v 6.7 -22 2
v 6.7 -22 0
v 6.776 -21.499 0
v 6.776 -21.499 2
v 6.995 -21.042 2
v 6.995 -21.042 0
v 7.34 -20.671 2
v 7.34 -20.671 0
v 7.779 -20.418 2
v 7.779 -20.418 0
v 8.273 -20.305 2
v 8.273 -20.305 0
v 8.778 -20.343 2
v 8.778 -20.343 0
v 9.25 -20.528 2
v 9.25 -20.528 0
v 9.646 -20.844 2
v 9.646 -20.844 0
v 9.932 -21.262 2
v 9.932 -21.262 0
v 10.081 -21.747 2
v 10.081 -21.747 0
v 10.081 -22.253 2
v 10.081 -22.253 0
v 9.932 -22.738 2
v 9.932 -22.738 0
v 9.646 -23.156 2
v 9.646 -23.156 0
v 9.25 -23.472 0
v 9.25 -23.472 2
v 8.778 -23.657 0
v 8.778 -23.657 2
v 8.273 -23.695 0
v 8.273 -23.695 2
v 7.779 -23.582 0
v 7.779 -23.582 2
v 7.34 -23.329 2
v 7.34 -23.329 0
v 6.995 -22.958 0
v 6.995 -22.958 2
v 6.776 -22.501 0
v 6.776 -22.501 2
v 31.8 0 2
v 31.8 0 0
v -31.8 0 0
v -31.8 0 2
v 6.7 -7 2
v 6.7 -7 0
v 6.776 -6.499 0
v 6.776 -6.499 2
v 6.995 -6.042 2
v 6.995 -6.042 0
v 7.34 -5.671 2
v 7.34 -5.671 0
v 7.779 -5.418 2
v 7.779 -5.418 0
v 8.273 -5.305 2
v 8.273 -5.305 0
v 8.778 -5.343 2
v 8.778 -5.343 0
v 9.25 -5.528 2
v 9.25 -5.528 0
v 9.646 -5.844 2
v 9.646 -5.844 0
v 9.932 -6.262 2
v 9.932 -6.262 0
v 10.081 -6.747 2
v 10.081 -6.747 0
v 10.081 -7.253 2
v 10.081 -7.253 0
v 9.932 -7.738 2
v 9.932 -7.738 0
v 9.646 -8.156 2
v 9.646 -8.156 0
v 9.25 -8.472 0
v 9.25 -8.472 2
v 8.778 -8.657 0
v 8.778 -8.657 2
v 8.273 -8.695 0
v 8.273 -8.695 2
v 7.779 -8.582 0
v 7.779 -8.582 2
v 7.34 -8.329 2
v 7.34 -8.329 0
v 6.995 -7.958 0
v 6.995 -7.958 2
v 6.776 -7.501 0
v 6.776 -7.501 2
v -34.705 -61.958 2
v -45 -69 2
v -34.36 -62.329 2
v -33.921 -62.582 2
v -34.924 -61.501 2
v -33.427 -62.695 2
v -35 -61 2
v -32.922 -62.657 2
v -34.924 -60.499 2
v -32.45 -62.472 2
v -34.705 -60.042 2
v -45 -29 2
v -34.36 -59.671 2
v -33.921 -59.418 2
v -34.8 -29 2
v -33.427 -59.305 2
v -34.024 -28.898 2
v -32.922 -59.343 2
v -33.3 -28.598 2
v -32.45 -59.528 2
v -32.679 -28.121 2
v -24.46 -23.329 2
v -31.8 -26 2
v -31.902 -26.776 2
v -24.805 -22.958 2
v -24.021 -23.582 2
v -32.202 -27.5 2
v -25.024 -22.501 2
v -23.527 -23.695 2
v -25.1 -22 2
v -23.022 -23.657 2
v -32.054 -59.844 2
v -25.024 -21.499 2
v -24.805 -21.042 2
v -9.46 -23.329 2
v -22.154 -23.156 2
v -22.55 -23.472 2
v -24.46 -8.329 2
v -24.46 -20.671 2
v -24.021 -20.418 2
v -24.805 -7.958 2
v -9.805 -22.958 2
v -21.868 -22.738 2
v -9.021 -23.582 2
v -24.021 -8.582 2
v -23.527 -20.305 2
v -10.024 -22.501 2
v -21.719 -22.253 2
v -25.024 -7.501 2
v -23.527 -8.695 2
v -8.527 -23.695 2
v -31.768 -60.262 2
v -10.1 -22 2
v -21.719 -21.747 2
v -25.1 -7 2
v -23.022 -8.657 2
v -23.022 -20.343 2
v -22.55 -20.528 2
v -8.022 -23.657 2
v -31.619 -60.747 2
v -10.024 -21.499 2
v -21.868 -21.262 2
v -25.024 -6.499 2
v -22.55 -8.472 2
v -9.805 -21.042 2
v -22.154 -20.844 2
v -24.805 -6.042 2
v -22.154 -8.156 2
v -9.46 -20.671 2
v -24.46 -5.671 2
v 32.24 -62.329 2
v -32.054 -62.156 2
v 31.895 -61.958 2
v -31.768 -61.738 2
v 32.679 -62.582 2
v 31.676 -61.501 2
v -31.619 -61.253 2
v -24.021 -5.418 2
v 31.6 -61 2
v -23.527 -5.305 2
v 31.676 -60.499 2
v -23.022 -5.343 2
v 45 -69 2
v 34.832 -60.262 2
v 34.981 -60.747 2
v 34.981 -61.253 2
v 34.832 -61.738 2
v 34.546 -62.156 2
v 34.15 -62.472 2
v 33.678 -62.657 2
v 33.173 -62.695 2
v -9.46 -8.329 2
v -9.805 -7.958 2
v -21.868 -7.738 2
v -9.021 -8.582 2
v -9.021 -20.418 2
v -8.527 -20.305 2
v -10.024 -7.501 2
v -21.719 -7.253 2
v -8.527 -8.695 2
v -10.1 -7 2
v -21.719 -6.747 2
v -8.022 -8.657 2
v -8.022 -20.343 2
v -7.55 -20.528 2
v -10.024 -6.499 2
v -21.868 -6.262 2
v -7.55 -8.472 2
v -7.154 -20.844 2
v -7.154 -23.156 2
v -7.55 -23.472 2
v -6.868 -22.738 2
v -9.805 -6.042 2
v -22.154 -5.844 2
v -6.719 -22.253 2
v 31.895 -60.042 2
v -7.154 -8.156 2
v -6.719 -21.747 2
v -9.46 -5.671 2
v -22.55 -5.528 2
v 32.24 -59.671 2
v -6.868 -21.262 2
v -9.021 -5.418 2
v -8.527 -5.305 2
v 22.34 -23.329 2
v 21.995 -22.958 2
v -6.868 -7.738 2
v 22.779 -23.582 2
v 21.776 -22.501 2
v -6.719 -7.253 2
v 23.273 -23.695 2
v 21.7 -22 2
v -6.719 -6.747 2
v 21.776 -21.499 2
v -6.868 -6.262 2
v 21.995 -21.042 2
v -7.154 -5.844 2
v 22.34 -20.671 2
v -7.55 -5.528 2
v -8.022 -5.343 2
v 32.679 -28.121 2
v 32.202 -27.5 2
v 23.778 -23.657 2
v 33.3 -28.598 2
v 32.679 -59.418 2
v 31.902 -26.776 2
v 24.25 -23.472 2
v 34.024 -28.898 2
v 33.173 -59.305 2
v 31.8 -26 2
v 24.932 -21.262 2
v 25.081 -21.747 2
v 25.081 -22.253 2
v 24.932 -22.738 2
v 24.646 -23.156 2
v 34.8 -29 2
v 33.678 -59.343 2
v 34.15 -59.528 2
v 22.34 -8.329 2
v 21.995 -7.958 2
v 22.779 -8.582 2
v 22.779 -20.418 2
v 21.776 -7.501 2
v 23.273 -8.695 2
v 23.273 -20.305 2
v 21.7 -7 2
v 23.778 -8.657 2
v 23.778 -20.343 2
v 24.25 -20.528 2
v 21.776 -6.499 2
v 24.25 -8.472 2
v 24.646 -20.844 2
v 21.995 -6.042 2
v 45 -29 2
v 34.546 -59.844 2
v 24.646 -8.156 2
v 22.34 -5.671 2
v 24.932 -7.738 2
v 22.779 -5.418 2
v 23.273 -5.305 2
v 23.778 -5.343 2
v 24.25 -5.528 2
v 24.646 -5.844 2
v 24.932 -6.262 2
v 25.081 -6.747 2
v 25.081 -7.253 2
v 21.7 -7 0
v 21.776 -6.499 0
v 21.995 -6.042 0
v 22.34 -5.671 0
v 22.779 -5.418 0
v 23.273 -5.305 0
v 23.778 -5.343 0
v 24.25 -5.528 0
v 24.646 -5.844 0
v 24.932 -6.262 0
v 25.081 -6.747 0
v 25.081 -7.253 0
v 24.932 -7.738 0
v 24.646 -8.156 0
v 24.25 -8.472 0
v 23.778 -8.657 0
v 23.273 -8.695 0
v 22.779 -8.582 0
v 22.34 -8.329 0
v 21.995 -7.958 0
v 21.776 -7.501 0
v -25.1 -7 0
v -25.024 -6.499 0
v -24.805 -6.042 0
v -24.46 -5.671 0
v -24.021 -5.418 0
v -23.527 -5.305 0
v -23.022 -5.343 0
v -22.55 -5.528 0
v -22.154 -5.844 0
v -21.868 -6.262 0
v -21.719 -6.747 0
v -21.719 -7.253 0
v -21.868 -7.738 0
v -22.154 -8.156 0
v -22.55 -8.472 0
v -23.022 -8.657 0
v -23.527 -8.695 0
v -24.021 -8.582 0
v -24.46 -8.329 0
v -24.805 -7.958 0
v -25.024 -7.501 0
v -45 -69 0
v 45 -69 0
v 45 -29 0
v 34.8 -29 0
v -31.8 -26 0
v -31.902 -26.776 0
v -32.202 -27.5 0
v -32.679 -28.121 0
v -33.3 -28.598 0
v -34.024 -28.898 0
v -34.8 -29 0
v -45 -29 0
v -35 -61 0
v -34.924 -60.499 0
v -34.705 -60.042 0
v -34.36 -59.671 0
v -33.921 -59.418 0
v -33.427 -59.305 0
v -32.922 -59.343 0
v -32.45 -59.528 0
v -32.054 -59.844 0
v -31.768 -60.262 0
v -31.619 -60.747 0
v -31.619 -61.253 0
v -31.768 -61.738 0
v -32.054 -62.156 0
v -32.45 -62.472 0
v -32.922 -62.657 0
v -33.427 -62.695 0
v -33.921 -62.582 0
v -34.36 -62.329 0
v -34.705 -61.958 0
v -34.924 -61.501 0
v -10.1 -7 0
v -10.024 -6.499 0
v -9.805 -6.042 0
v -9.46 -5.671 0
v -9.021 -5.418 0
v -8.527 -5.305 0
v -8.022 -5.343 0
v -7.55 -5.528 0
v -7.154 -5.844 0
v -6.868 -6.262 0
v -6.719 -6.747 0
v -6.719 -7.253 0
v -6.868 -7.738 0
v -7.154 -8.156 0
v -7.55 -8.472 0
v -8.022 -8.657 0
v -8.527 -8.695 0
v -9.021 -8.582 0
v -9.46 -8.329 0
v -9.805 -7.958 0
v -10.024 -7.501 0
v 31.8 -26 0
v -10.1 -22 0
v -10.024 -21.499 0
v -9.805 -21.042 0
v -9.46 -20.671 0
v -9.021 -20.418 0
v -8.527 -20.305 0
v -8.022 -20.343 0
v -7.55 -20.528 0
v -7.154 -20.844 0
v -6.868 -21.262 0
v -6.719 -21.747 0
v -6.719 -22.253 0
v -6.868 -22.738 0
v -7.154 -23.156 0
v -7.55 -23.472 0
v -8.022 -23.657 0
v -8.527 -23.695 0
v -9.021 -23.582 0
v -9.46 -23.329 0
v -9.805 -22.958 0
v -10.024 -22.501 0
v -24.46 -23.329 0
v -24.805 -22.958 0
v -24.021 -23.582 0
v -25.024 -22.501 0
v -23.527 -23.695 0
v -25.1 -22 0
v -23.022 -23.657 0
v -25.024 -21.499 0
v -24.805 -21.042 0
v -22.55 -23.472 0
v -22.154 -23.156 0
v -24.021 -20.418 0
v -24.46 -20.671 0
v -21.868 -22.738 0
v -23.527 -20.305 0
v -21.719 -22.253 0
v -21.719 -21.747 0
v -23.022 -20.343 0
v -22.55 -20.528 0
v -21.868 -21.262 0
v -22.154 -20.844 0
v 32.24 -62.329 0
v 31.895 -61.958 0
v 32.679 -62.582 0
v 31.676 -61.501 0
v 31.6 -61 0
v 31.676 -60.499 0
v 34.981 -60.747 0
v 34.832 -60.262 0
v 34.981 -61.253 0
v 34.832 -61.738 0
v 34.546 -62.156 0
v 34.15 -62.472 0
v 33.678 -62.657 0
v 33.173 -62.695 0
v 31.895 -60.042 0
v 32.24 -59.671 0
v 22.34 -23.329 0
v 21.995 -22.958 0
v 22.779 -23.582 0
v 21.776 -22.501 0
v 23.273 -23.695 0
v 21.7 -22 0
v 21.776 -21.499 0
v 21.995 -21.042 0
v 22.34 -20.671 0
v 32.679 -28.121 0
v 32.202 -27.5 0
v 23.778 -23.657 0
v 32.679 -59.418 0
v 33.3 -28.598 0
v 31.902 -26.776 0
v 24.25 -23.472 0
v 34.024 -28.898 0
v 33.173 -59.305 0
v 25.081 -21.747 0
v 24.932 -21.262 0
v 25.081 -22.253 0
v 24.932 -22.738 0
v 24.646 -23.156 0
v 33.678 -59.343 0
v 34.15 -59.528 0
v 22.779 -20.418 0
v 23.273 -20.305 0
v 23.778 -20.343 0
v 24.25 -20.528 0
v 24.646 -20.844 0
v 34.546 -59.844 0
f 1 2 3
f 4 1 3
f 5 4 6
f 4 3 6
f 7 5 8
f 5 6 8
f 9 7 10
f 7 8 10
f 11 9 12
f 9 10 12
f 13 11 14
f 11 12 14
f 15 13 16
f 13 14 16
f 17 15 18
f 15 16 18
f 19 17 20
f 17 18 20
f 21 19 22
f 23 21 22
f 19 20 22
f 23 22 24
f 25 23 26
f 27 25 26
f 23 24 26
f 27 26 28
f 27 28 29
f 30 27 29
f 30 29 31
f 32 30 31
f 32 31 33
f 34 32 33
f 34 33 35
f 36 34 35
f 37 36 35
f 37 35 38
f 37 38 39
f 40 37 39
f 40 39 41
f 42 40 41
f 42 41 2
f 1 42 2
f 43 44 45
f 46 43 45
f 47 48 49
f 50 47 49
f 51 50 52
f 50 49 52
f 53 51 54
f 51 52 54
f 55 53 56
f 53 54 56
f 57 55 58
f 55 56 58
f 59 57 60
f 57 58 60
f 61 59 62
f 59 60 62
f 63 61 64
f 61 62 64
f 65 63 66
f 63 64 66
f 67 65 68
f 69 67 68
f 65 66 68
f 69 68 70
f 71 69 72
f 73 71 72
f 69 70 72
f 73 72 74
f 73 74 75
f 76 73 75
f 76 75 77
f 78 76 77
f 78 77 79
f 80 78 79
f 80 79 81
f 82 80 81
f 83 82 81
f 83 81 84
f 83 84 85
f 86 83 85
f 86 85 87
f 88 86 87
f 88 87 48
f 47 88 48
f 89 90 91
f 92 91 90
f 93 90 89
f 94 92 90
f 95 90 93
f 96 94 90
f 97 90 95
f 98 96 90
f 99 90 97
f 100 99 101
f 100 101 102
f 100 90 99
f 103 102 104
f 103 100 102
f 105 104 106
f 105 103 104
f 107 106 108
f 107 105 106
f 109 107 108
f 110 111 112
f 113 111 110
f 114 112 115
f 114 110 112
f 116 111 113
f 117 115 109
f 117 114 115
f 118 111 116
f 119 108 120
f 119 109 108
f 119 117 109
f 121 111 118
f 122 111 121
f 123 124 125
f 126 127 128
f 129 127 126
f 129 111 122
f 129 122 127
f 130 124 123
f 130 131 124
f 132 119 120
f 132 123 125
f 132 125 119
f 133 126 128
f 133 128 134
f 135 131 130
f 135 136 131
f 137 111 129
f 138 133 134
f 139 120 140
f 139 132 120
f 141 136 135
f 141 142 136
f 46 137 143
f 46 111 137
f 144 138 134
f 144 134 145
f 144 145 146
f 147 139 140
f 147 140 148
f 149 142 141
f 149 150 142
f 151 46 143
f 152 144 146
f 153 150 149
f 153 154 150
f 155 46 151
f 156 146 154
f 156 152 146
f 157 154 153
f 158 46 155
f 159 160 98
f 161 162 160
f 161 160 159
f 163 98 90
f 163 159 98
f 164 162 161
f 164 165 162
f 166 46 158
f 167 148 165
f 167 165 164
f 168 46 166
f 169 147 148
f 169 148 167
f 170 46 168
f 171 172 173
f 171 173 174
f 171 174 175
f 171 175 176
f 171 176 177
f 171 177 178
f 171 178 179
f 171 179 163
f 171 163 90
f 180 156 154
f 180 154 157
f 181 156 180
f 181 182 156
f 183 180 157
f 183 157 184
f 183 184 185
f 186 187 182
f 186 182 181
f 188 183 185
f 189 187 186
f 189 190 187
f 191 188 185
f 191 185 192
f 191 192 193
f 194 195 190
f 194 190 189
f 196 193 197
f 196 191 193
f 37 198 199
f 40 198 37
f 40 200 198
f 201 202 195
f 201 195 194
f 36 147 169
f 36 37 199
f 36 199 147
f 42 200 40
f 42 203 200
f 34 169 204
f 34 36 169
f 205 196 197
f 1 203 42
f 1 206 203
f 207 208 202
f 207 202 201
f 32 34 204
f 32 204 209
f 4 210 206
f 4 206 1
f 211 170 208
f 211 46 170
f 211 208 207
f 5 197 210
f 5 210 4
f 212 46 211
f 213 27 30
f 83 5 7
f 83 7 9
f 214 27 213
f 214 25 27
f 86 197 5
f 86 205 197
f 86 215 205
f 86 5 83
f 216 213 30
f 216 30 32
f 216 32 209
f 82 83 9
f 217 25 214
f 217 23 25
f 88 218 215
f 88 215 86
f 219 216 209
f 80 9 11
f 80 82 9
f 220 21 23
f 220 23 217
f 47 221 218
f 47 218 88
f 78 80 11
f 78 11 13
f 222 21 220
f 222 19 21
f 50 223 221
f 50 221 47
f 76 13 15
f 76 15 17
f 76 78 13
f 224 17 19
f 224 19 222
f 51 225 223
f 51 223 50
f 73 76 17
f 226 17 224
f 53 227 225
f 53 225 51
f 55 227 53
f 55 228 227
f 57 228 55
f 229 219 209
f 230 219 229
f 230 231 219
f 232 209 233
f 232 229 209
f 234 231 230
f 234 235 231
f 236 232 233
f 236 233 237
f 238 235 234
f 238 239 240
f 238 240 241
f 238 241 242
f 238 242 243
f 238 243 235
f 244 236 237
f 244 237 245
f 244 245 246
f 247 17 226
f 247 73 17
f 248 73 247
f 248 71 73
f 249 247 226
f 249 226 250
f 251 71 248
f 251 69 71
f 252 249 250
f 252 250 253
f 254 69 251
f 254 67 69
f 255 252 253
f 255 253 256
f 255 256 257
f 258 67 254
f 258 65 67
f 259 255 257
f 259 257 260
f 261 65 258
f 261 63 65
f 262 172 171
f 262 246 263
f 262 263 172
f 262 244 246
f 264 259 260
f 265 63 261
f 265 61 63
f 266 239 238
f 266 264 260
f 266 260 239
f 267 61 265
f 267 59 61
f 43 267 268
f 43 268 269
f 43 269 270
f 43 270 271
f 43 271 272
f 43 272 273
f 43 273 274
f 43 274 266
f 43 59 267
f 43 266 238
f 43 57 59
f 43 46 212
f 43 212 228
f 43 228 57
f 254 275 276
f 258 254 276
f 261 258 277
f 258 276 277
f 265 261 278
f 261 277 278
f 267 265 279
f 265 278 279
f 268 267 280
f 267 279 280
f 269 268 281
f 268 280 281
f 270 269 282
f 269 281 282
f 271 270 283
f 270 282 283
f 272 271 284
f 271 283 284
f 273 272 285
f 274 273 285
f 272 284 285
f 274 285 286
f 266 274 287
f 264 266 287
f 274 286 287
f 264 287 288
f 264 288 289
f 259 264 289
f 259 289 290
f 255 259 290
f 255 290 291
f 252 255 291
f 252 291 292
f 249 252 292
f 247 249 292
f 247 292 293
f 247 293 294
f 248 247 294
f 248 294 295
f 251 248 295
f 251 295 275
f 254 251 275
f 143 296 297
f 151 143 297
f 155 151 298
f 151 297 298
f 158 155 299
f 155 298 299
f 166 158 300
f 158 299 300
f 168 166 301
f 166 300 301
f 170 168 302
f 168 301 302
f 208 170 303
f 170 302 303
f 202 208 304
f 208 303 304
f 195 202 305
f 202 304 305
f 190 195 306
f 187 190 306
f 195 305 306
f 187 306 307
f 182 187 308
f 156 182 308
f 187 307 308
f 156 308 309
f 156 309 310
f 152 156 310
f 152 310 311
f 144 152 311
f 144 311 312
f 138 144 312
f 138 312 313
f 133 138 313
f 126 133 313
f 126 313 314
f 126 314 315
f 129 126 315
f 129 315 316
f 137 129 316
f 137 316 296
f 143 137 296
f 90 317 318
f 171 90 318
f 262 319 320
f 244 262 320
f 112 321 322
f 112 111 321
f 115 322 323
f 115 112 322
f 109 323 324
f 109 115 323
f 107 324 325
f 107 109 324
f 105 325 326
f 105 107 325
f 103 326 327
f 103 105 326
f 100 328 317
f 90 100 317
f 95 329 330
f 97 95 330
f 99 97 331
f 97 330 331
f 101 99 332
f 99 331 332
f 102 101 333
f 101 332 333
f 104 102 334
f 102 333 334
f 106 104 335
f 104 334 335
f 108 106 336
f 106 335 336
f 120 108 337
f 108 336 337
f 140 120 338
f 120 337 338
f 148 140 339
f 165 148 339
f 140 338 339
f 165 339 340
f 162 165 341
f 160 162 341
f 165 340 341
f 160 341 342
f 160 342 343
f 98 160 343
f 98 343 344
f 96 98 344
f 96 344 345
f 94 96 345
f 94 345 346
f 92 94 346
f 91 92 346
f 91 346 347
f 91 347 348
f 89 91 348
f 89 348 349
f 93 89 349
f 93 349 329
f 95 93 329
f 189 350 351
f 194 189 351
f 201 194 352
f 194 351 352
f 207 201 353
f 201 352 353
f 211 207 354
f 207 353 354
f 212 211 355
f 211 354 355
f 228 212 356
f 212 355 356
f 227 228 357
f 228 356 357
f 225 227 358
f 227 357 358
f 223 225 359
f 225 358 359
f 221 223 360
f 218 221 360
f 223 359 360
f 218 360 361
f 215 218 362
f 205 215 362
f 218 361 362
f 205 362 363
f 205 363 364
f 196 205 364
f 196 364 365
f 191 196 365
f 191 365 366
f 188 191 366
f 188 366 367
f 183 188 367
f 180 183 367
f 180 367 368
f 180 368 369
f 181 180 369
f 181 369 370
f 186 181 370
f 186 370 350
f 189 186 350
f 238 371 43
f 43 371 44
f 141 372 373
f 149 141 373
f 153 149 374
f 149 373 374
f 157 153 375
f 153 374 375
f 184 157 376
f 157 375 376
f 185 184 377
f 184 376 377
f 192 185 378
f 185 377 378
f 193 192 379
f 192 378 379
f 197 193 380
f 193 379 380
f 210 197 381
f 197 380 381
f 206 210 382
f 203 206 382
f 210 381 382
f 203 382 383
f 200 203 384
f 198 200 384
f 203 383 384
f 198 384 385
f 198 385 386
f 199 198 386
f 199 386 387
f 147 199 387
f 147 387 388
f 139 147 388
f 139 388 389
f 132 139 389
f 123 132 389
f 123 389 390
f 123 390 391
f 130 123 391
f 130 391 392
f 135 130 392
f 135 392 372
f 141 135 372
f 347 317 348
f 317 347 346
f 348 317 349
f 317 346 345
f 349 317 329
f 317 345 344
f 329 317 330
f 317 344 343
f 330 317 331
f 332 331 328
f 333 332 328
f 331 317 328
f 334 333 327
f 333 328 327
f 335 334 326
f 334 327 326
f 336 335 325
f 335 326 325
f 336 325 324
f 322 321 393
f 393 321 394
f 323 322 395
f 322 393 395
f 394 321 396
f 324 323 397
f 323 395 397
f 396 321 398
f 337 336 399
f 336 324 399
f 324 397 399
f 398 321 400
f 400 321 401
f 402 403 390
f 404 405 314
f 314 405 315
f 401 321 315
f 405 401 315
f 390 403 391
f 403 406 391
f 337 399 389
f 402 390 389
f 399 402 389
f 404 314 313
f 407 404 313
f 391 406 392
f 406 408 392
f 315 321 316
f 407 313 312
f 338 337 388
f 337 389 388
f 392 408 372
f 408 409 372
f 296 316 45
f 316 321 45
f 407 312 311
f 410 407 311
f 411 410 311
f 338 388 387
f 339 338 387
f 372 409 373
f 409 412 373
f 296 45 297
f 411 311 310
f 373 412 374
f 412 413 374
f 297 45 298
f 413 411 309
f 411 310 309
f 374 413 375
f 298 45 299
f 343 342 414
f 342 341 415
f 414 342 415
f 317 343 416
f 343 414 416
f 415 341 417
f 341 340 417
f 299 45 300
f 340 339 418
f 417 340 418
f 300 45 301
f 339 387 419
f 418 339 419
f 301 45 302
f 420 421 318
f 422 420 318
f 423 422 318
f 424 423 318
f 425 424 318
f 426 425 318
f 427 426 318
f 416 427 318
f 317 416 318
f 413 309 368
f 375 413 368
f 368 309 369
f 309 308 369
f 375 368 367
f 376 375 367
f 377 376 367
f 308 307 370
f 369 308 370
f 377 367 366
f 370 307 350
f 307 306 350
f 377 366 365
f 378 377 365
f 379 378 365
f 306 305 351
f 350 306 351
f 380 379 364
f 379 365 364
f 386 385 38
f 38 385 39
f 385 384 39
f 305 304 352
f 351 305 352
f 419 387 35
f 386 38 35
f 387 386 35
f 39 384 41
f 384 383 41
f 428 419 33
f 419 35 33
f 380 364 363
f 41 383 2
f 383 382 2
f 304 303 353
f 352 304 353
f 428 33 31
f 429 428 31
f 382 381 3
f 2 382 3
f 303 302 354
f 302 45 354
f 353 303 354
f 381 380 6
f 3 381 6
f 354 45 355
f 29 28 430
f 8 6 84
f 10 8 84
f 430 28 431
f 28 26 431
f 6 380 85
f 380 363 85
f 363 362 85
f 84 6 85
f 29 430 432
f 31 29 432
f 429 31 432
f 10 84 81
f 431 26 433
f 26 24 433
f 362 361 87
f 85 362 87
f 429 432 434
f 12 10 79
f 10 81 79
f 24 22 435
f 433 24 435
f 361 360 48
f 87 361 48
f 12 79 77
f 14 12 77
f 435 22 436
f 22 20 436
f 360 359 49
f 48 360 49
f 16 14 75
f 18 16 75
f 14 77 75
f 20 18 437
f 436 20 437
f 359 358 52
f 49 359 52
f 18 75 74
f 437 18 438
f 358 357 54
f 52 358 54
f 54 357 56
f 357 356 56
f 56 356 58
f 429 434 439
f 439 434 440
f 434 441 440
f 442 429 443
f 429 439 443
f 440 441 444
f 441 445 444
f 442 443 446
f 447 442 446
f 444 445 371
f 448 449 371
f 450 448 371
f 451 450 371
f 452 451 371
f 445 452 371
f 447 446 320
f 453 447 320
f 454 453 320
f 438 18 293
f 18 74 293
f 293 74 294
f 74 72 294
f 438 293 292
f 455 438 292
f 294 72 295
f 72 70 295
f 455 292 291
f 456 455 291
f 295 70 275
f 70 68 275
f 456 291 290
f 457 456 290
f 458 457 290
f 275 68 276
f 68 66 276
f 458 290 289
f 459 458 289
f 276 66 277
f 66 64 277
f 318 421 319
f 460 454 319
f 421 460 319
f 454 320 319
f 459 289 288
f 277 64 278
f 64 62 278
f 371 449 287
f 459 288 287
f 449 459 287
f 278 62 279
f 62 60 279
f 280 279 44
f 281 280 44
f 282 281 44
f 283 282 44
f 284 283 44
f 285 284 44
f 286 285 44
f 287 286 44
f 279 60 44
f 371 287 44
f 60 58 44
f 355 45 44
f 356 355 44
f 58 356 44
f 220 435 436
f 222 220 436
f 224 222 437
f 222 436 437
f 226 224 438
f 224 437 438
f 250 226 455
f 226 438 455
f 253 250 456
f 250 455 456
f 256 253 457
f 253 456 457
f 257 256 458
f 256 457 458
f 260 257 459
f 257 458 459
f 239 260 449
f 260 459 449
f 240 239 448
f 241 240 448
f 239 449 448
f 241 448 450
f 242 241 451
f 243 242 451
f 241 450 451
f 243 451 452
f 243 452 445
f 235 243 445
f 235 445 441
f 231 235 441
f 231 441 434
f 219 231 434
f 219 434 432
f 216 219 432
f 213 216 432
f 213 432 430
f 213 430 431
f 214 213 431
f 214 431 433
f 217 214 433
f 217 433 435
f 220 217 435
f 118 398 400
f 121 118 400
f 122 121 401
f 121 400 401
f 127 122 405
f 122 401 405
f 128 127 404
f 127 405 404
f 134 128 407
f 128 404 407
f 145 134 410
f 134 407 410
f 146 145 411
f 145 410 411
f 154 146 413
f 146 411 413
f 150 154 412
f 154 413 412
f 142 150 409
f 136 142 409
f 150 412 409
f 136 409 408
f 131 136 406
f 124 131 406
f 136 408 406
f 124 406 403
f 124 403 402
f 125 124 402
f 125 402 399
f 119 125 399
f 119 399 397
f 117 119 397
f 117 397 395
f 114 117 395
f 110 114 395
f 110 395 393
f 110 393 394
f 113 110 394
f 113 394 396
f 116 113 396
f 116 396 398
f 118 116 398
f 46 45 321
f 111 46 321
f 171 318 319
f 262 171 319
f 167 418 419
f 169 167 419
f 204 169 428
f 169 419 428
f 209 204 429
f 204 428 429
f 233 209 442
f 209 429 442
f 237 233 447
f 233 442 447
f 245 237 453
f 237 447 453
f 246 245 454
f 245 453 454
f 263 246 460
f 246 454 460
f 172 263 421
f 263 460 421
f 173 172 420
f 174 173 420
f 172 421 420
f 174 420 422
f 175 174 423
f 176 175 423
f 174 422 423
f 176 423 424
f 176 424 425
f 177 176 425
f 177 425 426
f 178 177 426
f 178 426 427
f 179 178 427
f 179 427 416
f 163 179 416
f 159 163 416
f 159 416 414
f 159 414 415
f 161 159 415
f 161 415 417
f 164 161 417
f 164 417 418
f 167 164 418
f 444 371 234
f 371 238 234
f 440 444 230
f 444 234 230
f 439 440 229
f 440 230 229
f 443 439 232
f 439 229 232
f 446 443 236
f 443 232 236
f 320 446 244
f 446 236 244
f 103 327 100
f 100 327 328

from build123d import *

# Parameters (mm, degrees)
BASE_PLATE_DEPTH     = 2
M3_CLEARANCE_HOLE1_D = 3.4
FILLET1_R            = 3


with BuildPart() as part:
    # Sketch1 → Base Plate (new body)
    with BuildSketch(Plane.XY):
        Polygon((31.8, 0), (-31.8, 0), (-31.8, -29), (-45, -29), (-45, -69), (45, -69), (45, -29), (31.8, -29), align=None)
    extrude(amount=BASE_PLATE_DEPTH)

    # M3 Clearance Hole1 (through all)
    with Locations(Plane.XY.offset(2)):
        with Locations((-23.4, -7), (-8.4, -7), (-8.4, -22), (-23.4, -22), (-33.3, -61), (33.3, -61), (8.4, -22), (23.4, -22), (8.4, -7), (23.4, -7)):
            Hole(M3_CLEARANCE_HOLE1_D / 2)

    # Fillet1
    fillet1_edges = [part.edges().sort_by_distance(p)[0] for p in [
        (31.8, -29, 1),
        (-31.8, -29, 1),
    ]]
    fillet(fillet1_edges, radius=FILLET1_R)


solid = part.part
